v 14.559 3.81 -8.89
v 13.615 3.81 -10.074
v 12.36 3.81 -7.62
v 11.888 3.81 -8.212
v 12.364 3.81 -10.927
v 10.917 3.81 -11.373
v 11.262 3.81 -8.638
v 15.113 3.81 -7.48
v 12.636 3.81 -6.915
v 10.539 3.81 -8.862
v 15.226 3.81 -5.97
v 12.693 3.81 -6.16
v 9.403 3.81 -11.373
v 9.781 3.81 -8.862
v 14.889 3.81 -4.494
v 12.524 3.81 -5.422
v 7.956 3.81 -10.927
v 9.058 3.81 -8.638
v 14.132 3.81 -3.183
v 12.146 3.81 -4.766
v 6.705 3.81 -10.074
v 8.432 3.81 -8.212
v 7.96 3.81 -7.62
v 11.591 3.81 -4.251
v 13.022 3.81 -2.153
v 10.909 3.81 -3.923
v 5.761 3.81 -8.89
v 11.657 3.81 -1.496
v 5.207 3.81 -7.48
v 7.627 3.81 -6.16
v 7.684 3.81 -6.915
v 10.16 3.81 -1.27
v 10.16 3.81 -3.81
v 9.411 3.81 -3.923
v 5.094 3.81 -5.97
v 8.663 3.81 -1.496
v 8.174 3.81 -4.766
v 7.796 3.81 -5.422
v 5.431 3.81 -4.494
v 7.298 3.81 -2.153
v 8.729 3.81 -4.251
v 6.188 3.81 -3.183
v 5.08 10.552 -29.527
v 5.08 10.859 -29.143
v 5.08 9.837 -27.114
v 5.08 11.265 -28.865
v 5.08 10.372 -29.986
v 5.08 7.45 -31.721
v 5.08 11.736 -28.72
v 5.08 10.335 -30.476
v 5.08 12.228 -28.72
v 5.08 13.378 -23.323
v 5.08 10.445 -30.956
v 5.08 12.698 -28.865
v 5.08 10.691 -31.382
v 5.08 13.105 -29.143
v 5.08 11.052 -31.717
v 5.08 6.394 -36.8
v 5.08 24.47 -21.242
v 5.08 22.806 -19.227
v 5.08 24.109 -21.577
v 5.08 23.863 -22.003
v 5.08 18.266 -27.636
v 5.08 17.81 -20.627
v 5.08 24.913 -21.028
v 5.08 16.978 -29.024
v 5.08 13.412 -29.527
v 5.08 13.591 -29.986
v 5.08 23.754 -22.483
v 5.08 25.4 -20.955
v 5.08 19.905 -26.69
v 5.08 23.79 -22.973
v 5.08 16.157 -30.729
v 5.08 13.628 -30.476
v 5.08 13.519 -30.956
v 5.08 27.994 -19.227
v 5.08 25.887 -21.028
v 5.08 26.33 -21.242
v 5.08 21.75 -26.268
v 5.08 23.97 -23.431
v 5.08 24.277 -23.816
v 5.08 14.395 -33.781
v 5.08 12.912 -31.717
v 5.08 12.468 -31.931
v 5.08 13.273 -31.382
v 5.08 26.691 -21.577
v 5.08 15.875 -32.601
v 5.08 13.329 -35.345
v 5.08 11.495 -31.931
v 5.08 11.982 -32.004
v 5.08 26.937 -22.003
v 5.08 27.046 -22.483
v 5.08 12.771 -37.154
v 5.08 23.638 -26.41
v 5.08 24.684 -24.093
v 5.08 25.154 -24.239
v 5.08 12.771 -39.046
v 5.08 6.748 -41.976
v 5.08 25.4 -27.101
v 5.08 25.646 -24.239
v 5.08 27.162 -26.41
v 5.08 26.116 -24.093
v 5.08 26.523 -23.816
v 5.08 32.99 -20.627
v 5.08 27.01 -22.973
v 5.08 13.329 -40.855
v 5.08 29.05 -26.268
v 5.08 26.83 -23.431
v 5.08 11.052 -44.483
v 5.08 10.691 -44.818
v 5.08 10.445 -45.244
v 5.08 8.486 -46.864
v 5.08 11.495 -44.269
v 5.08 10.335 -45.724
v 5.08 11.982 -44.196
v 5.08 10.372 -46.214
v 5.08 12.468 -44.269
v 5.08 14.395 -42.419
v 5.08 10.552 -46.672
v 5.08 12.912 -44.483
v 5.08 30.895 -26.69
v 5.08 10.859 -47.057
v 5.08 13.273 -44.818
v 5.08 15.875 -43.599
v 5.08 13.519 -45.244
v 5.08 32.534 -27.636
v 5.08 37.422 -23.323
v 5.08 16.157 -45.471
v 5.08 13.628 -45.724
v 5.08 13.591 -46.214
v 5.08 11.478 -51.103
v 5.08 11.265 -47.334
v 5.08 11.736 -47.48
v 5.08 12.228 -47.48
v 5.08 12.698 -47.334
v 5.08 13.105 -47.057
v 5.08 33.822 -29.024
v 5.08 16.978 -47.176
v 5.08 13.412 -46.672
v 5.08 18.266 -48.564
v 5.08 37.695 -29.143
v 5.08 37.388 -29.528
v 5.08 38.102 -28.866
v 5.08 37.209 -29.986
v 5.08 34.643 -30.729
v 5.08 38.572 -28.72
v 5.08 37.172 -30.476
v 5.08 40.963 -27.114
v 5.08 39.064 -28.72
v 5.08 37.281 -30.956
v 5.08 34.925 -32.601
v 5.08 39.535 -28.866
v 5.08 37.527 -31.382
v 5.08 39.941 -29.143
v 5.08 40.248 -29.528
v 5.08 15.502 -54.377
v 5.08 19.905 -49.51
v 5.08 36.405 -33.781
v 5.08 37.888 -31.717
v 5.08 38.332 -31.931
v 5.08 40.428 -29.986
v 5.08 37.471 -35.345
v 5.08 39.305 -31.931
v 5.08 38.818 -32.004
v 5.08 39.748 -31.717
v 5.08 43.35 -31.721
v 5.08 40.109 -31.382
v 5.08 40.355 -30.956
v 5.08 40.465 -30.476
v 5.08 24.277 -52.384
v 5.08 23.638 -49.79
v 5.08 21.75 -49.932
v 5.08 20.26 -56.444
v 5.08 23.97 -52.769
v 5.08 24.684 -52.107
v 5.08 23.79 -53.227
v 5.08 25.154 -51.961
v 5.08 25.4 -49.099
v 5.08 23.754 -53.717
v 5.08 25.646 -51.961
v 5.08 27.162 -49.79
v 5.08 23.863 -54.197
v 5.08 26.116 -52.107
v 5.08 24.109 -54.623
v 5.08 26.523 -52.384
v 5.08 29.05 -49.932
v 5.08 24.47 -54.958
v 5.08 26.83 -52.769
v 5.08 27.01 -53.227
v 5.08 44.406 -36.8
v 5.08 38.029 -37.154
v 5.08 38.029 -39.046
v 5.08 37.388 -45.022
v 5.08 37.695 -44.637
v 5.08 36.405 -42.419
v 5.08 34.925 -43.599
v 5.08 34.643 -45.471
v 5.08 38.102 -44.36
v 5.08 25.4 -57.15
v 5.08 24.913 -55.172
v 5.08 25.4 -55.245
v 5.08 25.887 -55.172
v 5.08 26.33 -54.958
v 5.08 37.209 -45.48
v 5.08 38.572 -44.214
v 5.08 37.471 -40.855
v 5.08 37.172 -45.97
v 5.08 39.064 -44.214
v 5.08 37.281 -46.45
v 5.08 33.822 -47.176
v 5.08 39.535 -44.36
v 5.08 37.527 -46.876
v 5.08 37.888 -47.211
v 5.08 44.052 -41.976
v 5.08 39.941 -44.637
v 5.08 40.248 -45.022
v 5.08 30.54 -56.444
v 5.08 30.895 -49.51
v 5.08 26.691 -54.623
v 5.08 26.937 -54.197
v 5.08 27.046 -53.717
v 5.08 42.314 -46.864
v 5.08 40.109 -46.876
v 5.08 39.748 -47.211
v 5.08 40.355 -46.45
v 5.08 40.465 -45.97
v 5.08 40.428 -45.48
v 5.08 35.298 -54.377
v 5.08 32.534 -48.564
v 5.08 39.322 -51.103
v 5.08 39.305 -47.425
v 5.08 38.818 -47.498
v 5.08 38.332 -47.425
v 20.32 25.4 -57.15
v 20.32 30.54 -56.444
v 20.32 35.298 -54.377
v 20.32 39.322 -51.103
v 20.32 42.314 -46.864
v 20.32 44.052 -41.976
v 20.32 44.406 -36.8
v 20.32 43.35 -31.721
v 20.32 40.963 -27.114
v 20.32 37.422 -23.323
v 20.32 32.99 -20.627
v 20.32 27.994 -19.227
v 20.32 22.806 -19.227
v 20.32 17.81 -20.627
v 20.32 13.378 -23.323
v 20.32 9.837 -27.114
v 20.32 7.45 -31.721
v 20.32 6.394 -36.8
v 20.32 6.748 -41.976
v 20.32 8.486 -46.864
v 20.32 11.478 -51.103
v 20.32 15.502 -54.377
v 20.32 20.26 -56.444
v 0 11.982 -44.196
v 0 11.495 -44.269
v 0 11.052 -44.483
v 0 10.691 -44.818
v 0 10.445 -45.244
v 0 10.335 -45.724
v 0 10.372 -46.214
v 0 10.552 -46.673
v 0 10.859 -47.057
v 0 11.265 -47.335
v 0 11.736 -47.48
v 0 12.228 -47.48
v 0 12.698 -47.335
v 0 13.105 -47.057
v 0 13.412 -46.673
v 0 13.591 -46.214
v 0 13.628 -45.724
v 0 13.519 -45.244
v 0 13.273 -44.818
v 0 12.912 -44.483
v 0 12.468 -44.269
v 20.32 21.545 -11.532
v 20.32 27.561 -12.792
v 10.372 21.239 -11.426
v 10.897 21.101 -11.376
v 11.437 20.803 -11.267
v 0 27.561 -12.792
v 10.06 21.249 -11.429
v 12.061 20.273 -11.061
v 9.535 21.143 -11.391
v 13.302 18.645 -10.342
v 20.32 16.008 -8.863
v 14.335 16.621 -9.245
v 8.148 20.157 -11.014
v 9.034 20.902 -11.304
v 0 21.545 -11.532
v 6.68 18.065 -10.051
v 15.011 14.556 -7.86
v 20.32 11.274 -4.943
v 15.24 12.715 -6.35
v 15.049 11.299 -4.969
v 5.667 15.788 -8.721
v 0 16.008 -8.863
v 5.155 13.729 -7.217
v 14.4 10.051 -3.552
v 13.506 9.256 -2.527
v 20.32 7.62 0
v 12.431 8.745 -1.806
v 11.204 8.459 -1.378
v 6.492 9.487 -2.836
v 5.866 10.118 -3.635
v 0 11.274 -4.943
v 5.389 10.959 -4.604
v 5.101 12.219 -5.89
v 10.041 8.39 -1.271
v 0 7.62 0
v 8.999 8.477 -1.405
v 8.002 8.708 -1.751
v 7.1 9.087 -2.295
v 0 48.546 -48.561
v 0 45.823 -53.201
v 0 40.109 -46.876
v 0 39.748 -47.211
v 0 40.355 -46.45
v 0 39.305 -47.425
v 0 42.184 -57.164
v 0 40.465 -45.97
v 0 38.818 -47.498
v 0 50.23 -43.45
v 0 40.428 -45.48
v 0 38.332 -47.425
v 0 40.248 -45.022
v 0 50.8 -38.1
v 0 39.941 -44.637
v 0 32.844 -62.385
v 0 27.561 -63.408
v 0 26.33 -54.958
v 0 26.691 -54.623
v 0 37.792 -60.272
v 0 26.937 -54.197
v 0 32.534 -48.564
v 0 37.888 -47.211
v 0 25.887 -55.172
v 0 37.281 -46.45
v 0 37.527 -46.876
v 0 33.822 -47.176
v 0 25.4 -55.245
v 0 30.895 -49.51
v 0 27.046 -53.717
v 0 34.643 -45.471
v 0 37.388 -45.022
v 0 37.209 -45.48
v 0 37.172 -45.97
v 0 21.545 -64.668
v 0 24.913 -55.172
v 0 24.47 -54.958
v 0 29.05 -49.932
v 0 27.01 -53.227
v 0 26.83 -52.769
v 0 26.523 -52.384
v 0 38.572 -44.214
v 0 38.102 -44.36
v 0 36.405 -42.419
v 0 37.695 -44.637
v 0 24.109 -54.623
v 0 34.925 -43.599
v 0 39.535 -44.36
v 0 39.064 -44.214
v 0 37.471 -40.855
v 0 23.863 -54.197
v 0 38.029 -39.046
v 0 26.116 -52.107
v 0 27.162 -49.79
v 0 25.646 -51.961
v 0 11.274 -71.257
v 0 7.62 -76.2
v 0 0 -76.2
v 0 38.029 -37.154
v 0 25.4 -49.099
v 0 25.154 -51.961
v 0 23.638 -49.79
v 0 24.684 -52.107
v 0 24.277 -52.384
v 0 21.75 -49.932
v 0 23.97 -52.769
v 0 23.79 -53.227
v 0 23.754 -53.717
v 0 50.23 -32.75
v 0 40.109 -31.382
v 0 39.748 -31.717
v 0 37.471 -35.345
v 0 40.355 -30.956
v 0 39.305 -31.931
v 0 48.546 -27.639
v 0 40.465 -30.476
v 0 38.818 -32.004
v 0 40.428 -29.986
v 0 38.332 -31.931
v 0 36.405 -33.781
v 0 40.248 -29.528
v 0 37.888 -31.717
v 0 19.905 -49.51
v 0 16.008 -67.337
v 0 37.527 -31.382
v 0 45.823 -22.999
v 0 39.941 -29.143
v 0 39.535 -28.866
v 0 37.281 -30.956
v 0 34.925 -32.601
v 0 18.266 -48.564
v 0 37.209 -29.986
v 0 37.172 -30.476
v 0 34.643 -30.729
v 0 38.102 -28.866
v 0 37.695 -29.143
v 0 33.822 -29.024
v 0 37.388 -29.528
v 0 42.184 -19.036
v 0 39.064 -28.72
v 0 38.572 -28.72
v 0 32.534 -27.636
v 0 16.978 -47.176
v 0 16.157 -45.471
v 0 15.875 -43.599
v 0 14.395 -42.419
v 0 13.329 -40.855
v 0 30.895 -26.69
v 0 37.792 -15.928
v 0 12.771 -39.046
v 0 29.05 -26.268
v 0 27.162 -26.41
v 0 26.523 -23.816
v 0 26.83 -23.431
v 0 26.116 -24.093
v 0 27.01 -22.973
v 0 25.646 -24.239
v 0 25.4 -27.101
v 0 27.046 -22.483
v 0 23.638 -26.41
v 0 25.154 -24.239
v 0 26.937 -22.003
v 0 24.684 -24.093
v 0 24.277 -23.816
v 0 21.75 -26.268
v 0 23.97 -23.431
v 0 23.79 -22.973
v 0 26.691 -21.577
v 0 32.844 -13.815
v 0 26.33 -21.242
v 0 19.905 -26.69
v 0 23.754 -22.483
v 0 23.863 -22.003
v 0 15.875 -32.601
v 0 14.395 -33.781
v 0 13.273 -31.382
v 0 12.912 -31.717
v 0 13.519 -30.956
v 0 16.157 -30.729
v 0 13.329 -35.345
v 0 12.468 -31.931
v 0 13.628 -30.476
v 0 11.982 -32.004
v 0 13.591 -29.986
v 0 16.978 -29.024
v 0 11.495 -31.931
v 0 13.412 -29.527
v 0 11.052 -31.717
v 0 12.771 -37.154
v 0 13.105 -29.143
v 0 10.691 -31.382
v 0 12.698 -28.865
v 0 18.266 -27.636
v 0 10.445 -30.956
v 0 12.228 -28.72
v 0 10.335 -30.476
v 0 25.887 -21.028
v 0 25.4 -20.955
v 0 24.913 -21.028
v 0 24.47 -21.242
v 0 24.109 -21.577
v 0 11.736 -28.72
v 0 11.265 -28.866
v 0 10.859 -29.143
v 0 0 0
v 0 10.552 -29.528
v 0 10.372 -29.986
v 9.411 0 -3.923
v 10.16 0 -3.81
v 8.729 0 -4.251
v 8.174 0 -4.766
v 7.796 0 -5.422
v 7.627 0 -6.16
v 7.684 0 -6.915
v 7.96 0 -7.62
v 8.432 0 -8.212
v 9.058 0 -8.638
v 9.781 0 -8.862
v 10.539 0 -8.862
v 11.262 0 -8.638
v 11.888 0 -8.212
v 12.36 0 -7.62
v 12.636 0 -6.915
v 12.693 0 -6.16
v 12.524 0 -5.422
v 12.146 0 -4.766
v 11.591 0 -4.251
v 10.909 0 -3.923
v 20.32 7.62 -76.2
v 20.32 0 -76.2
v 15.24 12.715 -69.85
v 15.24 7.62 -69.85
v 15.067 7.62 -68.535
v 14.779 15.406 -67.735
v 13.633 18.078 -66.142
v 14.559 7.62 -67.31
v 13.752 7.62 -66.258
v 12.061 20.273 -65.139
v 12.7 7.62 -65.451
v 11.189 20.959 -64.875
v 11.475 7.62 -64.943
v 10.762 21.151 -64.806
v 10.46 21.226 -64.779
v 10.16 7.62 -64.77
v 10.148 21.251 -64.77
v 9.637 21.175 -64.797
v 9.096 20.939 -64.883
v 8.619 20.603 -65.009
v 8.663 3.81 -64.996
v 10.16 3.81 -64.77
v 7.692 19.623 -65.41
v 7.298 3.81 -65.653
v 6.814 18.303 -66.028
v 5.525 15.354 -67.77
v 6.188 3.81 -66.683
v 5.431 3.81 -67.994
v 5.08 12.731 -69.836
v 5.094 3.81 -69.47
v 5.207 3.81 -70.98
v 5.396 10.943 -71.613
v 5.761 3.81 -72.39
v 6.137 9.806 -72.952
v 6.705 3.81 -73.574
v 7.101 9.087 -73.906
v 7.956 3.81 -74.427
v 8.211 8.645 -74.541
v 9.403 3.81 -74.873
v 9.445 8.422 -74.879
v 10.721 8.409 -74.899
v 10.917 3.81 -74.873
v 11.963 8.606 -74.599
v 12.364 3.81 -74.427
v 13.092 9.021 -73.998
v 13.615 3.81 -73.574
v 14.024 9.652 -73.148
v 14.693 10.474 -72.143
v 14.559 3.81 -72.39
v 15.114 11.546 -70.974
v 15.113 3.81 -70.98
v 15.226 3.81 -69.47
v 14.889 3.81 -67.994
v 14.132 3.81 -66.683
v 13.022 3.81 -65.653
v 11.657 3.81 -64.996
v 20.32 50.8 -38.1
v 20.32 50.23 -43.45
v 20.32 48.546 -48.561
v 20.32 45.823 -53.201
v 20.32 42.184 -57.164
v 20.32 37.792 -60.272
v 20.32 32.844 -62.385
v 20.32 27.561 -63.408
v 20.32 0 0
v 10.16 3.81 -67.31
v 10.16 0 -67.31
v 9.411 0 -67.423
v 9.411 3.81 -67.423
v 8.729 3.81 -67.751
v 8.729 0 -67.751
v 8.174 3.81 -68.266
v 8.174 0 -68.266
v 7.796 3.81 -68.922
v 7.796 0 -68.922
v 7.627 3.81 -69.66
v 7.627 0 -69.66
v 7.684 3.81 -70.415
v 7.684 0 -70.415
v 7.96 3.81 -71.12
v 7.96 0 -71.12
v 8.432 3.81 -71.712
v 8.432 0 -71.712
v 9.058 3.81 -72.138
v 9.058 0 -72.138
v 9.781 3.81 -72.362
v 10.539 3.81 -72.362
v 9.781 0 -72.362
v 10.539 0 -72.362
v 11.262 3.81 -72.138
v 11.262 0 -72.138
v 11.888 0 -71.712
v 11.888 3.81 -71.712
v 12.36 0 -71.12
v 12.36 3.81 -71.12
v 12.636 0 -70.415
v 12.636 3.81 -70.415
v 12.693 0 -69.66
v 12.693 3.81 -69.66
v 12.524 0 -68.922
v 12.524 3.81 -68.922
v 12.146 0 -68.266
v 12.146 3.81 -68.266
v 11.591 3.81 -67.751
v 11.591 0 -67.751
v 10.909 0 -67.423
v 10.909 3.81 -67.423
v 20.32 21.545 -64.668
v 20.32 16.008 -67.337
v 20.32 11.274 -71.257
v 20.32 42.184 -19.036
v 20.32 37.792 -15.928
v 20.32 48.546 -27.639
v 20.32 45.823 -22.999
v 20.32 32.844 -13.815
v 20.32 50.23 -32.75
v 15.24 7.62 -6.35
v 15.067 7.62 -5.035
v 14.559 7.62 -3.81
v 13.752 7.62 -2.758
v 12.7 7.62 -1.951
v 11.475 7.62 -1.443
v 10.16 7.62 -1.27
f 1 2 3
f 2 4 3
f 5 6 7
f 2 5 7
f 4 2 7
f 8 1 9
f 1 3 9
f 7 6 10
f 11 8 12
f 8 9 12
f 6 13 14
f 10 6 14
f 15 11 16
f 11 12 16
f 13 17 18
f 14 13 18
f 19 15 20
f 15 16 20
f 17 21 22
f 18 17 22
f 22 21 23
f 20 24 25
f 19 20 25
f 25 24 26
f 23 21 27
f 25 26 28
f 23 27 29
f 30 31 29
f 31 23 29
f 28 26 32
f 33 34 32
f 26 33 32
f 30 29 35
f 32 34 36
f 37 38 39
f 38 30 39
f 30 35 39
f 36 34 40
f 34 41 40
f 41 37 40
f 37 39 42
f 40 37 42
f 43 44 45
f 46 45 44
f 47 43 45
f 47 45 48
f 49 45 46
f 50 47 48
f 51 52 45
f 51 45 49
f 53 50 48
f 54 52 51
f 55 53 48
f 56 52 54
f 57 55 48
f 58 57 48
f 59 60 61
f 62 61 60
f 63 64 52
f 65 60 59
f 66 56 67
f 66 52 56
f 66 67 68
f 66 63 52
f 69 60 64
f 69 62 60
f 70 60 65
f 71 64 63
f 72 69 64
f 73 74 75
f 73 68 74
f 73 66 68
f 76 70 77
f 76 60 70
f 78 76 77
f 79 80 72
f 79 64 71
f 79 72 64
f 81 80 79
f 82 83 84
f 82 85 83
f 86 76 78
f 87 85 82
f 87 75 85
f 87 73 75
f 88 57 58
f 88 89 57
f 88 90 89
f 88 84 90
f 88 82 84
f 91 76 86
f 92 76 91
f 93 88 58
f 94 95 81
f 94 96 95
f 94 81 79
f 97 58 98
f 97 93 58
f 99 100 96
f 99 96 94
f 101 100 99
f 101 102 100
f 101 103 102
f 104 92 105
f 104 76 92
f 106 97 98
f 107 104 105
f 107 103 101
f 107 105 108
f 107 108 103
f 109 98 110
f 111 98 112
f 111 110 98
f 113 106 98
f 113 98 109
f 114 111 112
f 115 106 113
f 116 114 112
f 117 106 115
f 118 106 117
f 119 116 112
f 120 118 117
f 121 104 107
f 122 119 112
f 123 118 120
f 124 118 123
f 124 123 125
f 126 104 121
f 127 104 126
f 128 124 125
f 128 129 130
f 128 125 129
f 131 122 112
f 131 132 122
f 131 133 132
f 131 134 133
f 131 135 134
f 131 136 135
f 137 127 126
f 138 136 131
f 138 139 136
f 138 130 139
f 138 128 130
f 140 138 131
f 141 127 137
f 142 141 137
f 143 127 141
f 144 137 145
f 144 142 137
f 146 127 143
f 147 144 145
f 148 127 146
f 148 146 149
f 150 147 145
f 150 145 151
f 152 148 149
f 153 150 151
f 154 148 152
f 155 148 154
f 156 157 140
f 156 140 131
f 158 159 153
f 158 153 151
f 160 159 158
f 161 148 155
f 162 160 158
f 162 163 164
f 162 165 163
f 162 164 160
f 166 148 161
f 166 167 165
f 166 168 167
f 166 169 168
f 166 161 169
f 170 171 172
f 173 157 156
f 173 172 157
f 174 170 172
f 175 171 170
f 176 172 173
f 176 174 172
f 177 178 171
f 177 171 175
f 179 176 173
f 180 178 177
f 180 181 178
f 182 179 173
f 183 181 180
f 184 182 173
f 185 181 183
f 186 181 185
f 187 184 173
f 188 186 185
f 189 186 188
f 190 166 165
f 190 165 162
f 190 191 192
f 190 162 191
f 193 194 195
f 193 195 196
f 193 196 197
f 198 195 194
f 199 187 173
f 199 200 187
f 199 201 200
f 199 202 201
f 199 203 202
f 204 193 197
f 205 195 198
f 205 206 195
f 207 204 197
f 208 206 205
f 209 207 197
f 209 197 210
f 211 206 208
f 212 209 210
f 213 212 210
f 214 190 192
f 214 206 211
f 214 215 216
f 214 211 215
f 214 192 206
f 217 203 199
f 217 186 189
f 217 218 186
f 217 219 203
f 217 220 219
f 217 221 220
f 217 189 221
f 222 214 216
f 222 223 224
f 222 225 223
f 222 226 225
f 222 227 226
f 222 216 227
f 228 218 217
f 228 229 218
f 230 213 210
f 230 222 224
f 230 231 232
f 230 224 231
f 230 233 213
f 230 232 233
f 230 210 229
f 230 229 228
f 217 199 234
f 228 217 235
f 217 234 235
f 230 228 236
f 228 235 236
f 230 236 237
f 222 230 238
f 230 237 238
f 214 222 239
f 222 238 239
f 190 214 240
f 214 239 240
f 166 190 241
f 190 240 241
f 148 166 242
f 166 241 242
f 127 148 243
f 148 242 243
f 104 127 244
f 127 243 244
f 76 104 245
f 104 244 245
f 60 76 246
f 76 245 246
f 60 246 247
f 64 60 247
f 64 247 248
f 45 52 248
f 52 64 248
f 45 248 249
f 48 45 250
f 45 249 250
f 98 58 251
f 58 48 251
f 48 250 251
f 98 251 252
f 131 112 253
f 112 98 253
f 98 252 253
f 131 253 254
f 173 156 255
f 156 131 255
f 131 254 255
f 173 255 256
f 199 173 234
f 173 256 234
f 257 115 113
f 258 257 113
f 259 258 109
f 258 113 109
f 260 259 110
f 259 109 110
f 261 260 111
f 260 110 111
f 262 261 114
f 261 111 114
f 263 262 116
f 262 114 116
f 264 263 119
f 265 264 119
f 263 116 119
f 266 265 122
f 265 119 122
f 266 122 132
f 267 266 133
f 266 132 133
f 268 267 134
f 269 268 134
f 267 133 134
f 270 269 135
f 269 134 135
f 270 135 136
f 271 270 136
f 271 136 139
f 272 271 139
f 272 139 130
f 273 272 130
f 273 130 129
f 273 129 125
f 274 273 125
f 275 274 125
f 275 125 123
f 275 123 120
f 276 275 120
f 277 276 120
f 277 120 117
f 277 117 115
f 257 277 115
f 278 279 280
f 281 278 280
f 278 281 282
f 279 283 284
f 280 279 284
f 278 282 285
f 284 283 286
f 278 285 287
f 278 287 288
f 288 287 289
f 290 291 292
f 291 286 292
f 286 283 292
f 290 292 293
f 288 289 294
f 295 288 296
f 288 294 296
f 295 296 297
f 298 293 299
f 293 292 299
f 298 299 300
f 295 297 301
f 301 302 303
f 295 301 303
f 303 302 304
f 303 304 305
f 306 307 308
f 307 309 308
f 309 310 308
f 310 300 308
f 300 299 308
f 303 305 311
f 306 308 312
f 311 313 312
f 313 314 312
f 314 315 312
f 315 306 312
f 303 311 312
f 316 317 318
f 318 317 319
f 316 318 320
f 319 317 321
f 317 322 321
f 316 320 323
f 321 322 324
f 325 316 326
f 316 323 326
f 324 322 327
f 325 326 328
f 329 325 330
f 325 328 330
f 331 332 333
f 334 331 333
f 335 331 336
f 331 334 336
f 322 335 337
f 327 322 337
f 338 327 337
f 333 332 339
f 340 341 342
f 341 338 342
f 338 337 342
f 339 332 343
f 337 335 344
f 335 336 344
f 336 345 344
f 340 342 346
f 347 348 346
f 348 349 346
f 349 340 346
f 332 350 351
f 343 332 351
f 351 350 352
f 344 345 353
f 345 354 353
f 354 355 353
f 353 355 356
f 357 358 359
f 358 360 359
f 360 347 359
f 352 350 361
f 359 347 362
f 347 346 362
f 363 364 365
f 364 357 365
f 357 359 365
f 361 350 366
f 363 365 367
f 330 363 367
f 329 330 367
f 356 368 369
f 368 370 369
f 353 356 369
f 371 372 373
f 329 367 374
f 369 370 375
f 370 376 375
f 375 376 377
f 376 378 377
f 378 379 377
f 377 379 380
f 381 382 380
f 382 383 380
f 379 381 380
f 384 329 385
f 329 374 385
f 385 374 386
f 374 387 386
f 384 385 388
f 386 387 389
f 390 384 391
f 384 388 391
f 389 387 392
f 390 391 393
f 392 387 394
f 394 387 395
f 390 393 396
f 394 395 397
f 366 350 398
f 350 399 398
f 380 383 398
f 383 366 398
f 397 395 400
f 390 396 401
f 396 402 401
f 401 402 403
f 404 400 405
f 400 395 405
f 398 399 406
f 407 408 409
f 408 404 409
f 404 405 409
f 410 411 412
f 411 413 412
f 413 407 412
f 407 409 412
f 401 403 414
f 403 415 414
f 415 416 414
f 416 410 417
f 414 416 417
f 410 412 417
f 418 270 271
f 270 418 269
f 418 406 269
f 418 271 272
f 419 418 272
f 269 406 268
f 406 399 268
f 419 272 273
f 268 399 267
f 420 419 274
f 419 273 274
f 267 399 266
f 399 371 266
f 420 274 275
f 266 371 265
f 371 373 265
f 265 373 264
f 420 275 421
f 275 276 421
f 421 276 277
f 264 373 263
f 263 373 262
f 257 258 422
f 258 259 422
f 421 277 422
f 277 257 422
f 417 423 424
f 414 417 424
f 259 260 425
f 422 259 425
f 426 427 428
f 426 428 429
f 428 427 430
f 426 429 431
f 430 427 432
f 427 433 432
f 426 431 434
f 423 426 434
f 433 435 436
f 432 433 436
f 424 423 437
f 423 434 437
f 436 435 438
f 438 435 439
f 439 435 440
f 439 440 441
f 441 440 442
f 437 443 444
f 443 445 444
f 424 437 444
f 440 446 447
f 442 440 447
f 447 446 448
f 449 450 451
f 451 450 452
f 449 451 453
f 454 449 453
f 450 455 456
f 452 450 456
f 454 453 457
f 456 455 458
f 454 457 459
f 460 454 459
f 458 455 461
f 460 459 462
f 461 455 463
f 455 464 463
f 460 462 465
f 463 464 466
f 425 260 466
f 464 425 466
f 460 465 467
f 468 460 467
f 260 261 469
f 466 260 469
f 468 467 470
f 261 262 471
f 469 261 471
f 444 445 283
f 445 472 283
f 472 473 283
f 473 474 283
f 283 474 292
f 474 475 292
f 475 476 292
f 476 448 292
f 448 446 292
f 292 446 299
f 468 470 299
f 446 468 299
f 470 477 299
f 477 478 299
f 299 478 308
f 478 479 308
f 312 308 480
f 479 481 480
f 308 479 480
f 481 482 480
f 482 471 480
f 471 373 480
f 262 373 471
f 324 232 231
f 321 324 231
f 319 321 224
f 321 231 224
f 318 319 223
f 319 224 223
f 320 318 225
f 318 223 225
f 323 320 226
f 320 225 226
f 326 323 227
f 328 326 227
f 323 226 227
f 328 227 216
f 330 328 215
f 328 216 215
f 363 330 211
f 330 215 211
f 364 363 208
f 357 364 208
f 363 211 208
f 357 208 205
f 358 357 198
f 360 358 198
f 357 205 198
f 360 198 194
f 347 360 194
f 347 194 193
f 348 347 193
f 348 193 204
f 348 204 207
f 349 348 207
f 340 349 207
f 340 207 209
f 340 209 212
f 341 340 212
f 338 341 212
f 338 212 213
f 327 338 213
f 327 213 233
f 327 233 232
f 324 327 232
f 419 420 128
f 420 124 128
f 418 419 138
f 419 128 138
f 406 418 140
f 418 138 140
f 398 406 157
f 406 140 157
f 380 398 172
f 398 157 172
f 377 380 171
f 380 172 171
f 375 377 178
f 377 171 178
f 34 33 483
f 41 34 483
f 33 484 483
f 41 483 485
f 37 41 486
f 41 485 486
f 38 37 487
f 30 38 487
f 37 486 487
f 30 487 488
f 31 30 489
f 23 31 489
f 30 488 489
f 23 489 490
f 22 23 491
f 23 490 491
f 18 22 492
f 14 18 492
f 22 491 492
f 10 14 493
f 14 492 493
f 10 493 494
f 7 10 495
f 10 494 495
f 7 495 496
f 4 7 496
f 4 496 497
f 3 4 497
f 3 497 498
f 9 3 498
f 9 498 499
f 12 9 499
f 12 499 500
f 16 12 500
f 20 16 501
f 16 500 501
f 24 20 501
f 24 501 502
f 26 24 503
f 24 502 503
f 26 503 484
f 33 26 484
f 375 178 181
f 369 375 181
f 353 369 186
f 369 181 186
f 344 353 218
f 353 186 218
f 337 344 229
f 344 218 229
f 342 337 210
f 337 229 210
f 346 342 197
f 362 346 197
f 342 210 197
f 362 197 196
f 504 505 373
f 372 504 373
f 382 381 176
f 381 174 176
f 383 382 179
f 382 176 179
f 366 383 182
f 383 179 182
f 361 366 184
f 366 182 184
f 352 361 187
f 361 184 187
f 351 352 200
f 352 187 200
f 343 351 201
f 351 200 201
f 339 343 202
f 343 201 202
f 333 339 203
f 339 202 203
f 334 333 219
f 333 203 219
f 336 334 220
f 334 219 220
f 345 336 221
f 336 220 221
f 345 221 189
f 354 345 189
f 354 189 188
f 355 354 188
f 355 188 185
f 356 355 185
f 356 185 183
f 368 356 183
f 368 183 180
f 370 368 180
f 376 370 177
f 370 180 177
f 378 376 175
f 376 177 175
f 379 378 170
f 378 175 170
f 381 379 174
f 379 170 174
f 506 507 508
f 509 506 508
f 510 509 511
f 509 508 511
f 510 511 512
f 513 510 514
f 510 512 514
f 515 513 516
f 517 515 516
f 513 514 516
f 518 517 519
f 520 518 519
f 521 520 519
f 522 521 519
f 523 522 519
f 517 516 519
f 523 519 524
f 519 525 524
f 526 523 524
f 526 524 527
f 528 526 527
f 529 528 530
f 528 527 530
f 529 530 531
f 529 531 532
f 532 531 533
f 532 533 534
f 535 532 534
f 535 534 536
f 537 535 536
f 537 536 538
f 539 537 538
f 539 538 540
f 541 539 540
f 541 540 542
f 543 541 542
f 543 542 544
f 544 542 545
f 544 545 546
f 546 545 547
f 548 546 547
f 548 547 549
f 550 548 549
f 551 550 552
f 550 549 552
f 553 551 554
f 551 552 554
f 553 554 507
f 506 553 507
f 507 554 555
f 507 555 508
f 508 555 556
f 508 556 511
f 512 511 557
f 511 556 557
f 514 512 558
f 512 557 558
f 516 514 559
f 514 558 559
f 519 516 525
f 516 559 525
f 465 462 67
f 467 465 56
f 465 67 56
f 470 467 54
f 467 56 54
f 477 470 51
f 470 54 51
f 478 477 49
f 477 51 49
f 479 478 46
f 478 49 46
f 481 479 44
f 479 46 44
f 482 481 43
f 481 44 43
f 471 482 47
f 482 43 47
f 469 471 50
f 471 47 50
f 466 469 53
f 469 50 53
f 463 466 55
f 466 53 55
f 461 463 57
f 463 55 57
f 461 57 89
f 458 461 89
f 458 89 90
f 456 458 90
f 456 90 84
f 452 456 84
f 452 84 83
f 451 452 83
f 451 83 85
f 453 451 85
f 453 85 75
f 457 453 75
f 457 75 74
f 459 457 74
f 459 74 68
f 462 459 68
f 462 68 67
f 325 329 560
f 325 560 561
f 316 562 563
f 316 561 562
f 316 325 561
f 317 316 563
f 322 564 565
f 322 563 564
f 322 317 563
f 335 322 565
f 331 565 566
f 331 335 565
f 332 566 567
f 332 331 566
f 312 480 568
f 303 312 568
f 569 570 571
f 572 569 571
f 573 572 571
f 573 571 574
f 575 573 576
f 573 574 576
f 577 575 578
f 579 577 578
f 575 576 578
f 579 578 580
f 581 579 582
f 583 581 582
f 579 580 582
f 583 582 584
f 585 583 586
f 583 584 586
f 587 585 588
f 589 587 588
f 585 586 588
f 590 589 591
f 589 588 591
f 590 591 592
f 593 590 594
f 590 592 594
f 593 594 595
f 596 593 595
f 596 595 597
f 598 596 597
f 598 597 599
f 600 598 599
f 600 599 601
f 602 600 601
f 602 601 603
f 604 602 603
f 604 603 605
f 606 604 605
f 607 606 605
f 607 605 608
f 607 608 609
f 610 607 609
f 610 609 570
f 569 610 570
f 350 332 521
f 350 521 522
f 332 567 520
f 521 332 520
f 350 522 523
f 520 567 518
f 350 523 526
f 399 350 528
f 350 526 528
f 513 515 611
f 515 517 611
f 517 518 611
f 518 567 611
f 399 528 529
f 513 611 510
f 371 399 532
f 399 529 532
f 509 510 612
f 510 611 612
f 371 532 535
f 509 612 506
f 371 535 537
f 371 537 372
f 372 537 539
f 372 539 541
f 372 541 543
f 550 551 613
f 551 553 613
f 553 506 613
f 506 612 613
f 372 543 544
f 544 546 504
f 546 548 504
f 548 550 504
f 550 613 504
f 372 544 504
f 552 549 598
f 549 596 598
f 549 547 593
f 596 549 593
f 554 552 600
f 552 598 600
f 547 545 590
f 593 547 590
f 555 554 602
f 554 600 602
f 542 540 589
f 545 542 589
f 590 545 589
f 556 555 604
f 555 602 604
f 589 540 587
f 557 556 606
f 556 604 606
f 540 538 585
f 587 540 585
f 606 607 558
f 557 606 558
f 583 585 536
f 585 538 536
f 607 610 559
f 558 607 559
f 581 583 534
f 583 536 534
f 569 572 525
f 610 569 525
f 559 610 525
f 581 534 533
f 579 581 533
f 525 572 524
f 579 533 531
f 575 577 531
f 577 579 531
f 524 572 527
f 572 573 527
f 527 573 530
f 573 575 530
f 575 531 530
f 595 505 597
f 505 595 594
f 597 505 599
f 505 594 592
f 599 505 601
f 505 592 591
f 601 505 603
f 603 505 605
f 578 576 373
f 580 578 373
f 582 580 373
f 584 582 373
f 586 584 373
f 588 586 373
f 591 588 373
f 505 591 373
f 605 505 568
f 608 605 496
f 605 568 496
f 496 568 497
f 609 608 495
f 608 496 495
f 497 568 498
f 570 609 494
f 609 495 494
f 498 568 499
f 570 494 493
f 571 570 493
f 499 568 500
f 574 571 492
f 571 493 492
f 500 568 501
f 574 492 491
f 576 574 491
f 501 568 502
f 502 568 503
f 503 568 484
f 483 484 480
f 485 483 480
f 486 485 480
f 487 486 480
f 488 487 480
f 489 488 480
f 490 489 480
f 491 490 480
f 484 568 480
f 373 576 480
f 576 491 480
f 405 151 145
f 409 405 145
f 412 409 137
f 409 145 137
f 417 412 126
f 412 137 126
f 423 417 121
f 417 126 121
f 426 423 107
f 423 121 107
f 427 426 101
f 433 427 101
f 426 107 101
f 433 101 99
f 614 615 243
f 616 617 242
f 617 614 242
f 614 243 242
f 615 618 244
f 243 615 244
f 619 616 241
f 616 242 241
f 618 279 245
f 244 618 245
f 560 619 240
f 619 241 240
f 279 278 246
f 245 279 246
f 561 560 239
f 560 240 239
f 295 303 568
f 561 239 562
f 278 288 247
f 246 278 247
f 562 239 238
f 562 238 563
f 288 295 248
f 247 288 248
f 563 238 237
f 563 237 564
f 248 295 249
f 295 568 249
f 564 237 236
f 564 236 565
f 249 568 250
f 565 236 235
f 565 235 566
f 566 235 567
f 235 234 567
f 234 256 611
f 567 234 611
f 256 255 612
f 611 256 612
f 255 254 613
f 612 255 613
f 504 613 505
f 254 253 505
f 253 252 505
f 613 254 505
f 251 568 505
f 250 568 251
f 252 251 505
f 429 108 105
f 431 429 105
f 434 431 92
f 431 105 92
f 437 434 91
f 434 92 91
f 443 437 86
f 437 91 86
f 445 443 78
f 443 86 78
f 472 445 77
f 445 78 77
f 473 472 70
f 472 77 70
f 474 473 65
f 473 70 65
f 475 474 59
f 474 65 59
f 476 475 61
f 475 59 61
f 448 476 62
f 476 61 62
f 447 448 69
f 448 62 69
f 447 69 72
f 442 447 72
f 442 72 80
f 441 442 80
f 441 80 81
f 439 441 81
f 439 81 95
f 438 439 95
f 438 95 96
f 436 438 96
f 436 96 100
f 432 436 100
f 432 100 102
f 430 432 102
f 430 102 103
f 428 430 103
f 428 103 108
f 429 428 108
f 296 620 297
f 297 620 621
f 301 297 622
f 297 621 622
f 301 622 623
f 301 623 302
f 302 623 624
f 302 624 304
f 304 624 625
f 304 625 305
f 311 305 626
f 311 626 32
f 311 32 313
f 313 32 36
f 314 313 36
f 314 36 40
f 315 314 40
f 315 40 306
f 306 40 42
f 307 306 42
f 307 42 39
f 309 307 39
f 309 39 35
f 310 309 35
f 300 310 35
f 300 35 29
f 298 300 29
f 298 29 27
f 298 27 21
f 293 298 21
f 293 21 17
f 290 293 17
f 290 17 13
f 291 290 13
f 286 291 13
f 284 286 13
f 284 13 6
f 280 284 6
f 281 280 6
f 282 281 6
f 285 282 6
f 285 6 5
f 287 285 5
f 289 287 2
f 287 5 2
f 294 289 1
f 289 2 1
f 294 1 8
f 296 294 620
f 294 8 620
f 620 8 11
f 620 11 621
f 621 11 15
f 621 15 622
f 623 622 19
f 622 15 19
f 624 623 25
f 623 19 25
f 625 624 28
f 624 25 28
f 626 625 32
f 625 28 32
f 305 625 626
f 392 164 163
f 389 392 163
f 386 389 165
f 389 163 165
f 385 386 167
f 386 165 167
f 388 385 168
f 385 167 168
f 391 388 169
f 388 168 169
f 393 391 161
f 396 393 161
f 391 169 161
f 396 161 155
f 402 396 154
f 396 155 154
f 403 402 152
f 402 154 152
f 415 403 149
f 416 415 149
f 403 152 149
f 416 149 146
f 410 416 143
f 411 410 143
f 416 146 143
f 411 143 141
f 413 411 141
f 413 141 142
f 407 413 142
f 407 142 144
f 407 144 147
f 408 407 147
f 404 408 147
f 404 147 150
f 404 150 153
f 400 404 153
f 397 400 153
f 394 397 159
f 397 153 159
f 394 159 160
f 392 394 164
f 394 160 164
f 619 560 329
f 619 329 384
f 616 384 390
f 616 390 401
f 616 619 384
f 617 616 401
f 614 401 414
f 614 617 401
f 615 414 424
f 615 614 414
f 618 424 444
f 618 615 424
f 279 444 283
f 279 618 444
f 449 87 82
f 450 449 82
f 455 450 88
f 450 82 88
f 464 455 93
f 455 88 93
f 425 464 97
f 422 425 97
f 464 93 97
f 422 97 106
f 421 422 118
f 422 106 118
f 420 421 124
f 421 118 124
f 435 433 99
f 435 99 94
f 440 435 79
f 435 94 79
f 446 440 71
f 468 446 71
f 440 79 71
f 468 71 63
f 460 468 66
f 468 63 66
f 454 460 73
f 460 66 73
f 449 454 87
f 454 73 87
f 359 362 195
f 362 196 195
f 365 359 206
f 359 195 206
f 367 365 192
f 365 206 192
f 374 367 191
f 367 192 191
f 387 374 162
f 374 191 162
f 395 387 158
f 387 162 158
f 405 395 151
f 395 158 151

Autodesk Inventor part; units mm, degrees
ref_plane "YZ Plane" through (0, 0, 0) normal (1, 0, 0) x (0, 1, 0)
ref_plane "XZ Plane" through (0, 0, 0) normal (0, 1, 0) x (-1, 0, 0)
ref_plane "XY Plane" through (0, 0, 0) normal (0, 0, 1) x (1, 0, 0)
sketch "Sketch1" plane through (0, 0, 0) normal (0, 1, 0) x (-1, 0, 0)
  line L0 (0, 0) -> (-20.32, 0)
  line L1 (-20.32, 0) -> (-20.32, -76.2)
  line L2 (-20.32, -76.2) -> (0, -76.2)
  line L3 (0, -76.2) -> (0, 0)
  dimension "d0" = 20.32
  dimension "d1" = 76.2
extrude "Extrusion1" add sketch "Sketch1" along normal blind 7.62
sketch "Sketch2" plane through (0, 7.62, 0) normal (0, 1, 0) x (1, 0, 0)
  line L0 (0, 0) -> (0, 12.7)
  line L1 (0, 12.7) -> (20.32, 12.7)
  line L2 (20.32, 12.7) -> (20.32, 63.5)
  line L3 (20.32, 63.5) -> (0, 63.5)
  line L4 (0, 63.5) -> (0, 12.7)
  dimension "d4" = 12.7
  dimension "d5" = 20.32
  dimension "d6" = 50.8
extrude "Extrusion2" add sketch "Sketch2" along normal blind 43.18
sketch "Sketch3" plane through (20.32, 0, 0) normal (1, 0, 0) x (0, 0, -1)
  line L0 (12.7, 50.8) -> (63.5, 50.8) projected
  line L1 (38.1, 50.8) -> (38.1, 25.4)
  circle A0 centre (38.1, 25.4) radius 19.05
  point P0 (0, 0)
  dimension "d9" = 25.4
  dimension "d10" = 38.1
extrude "Extrusion3" cut sketch "Sketch3" against normal blind 15.24
fillet "Fillet1" radius 25.4 2 edges at (10.16, 50.8, -63.5) (10.16, 50.8, -12.7)
sketch "Sketch6" plane through (0, 7.62, 0) normal (0, 1, 0) x (1, 0, 0)
  line L0 (0, 0) -> (20.32, 0) projected
  line L1 (10.16, 0) -> (10.16, 6.35)
  line L2 (20.32, 76.2) -> (0, 76.2) projected
  line L3 (10.16, 76.2) -> (10.16, 69.85)
  dimension "d20" = 6.35
  dimension "d21" = 6.35
fillet "Fillet2" radius 25.4 2 edges at (10.16, 7.62, -63.5) (10.16, 7.62, -12.7)
hole "Hole1" at (10.16, 7.62, -6.35) at (10.16, 7.62, -69.85) direction (0, -1, 0) diameter 5.08 end through all counterbore diameter 10.16 counterbore depth 3.81
sketch "Sketch7" plane through (10.16, 7.62, -6.35) normal (0, -1, 0) x (1, 0, 0)
  circle A0 centre (0, 0) radius 5.08
  circle A1 centre (0, -63.5) radius 2.54 projected
  line L0 (-2.54, -63.5) -> (0, -63.5)
  circle A2 centre (0, -63.5) radius 5.08
  point P0 (-10.16, 6.35)
  dimension "d30" = 10.16
  dimension "d31" = 10.16
extrude "Extrusion5" cut sketch "Sketch7" against normal blind 15.24 contours A0 | A1 | A2
sketch "Sketch10" plane through (5.08, 25.4, -38.1) normal (1, 0, 0) x (0, 0, -1)
  line L0 (0, 0) -> (0, 6.35)
  circle A0 centre (0, 6.35) radius 6.35
  point P0 (-38.1, -25.4)
  dimension "d65" = 6.35
extrude "Extrusion8" cut sketch "Sketch10" against normal blind 25.4
sketch "Sketch12" plane through (5.08, 25.4, -38.1) normal (1, 0, 0) x (0, 0, -1)
  circle A0 centre (0, 6.35) radius 6.35 projected
  line L0 (0, 0) -> (14.3694, 0) construction
  line L1 (0, 0) -> (14.3694, 0) construction
  line L2 (0, 0) -> (-7.747, 13.4182)
  line L3 (0, 0) -> (15.494, 0) construction
  line L4 (0, 0) -> (7.747, 13.4182)
  line L5 (0, 0) -> (15.494, 0) construction
  circle A1 centre (-7.747, 13.4182) radius 1.651
  circle A2 centre (7.747, 13.4182) radius 1.651
  point P0 (-38.1, -25.4)
  dimension "d79" = 15.494
  dimension "d80" = 120
  dimension "d81" = 15.494
  dimension "d82" = 60
  dimension "d83" = 3.302
  dimension "d84" = 3.302
extrude "Extrusion9" cut sketch "Sketch12" against normal blind 25.4 contours A1 | A2
sketch "Sketch13" plane through (5.08, 25.4, -38.1) normal (1, 0, 0) x (0, 0, -1)
  circle A0 centre (0, 6.35) radius 6.35 projected
  point P0 (-38.1, -25.4)
  point P1 (0, 0)
pattern_circular "Circular Pattern3" count 6 over 360 about axis through (5.08, 25.4, -38.1) along (1, 0, 0) of "Extrusion8", "Extrusion9"
properties part number "Motor Mount V2"
